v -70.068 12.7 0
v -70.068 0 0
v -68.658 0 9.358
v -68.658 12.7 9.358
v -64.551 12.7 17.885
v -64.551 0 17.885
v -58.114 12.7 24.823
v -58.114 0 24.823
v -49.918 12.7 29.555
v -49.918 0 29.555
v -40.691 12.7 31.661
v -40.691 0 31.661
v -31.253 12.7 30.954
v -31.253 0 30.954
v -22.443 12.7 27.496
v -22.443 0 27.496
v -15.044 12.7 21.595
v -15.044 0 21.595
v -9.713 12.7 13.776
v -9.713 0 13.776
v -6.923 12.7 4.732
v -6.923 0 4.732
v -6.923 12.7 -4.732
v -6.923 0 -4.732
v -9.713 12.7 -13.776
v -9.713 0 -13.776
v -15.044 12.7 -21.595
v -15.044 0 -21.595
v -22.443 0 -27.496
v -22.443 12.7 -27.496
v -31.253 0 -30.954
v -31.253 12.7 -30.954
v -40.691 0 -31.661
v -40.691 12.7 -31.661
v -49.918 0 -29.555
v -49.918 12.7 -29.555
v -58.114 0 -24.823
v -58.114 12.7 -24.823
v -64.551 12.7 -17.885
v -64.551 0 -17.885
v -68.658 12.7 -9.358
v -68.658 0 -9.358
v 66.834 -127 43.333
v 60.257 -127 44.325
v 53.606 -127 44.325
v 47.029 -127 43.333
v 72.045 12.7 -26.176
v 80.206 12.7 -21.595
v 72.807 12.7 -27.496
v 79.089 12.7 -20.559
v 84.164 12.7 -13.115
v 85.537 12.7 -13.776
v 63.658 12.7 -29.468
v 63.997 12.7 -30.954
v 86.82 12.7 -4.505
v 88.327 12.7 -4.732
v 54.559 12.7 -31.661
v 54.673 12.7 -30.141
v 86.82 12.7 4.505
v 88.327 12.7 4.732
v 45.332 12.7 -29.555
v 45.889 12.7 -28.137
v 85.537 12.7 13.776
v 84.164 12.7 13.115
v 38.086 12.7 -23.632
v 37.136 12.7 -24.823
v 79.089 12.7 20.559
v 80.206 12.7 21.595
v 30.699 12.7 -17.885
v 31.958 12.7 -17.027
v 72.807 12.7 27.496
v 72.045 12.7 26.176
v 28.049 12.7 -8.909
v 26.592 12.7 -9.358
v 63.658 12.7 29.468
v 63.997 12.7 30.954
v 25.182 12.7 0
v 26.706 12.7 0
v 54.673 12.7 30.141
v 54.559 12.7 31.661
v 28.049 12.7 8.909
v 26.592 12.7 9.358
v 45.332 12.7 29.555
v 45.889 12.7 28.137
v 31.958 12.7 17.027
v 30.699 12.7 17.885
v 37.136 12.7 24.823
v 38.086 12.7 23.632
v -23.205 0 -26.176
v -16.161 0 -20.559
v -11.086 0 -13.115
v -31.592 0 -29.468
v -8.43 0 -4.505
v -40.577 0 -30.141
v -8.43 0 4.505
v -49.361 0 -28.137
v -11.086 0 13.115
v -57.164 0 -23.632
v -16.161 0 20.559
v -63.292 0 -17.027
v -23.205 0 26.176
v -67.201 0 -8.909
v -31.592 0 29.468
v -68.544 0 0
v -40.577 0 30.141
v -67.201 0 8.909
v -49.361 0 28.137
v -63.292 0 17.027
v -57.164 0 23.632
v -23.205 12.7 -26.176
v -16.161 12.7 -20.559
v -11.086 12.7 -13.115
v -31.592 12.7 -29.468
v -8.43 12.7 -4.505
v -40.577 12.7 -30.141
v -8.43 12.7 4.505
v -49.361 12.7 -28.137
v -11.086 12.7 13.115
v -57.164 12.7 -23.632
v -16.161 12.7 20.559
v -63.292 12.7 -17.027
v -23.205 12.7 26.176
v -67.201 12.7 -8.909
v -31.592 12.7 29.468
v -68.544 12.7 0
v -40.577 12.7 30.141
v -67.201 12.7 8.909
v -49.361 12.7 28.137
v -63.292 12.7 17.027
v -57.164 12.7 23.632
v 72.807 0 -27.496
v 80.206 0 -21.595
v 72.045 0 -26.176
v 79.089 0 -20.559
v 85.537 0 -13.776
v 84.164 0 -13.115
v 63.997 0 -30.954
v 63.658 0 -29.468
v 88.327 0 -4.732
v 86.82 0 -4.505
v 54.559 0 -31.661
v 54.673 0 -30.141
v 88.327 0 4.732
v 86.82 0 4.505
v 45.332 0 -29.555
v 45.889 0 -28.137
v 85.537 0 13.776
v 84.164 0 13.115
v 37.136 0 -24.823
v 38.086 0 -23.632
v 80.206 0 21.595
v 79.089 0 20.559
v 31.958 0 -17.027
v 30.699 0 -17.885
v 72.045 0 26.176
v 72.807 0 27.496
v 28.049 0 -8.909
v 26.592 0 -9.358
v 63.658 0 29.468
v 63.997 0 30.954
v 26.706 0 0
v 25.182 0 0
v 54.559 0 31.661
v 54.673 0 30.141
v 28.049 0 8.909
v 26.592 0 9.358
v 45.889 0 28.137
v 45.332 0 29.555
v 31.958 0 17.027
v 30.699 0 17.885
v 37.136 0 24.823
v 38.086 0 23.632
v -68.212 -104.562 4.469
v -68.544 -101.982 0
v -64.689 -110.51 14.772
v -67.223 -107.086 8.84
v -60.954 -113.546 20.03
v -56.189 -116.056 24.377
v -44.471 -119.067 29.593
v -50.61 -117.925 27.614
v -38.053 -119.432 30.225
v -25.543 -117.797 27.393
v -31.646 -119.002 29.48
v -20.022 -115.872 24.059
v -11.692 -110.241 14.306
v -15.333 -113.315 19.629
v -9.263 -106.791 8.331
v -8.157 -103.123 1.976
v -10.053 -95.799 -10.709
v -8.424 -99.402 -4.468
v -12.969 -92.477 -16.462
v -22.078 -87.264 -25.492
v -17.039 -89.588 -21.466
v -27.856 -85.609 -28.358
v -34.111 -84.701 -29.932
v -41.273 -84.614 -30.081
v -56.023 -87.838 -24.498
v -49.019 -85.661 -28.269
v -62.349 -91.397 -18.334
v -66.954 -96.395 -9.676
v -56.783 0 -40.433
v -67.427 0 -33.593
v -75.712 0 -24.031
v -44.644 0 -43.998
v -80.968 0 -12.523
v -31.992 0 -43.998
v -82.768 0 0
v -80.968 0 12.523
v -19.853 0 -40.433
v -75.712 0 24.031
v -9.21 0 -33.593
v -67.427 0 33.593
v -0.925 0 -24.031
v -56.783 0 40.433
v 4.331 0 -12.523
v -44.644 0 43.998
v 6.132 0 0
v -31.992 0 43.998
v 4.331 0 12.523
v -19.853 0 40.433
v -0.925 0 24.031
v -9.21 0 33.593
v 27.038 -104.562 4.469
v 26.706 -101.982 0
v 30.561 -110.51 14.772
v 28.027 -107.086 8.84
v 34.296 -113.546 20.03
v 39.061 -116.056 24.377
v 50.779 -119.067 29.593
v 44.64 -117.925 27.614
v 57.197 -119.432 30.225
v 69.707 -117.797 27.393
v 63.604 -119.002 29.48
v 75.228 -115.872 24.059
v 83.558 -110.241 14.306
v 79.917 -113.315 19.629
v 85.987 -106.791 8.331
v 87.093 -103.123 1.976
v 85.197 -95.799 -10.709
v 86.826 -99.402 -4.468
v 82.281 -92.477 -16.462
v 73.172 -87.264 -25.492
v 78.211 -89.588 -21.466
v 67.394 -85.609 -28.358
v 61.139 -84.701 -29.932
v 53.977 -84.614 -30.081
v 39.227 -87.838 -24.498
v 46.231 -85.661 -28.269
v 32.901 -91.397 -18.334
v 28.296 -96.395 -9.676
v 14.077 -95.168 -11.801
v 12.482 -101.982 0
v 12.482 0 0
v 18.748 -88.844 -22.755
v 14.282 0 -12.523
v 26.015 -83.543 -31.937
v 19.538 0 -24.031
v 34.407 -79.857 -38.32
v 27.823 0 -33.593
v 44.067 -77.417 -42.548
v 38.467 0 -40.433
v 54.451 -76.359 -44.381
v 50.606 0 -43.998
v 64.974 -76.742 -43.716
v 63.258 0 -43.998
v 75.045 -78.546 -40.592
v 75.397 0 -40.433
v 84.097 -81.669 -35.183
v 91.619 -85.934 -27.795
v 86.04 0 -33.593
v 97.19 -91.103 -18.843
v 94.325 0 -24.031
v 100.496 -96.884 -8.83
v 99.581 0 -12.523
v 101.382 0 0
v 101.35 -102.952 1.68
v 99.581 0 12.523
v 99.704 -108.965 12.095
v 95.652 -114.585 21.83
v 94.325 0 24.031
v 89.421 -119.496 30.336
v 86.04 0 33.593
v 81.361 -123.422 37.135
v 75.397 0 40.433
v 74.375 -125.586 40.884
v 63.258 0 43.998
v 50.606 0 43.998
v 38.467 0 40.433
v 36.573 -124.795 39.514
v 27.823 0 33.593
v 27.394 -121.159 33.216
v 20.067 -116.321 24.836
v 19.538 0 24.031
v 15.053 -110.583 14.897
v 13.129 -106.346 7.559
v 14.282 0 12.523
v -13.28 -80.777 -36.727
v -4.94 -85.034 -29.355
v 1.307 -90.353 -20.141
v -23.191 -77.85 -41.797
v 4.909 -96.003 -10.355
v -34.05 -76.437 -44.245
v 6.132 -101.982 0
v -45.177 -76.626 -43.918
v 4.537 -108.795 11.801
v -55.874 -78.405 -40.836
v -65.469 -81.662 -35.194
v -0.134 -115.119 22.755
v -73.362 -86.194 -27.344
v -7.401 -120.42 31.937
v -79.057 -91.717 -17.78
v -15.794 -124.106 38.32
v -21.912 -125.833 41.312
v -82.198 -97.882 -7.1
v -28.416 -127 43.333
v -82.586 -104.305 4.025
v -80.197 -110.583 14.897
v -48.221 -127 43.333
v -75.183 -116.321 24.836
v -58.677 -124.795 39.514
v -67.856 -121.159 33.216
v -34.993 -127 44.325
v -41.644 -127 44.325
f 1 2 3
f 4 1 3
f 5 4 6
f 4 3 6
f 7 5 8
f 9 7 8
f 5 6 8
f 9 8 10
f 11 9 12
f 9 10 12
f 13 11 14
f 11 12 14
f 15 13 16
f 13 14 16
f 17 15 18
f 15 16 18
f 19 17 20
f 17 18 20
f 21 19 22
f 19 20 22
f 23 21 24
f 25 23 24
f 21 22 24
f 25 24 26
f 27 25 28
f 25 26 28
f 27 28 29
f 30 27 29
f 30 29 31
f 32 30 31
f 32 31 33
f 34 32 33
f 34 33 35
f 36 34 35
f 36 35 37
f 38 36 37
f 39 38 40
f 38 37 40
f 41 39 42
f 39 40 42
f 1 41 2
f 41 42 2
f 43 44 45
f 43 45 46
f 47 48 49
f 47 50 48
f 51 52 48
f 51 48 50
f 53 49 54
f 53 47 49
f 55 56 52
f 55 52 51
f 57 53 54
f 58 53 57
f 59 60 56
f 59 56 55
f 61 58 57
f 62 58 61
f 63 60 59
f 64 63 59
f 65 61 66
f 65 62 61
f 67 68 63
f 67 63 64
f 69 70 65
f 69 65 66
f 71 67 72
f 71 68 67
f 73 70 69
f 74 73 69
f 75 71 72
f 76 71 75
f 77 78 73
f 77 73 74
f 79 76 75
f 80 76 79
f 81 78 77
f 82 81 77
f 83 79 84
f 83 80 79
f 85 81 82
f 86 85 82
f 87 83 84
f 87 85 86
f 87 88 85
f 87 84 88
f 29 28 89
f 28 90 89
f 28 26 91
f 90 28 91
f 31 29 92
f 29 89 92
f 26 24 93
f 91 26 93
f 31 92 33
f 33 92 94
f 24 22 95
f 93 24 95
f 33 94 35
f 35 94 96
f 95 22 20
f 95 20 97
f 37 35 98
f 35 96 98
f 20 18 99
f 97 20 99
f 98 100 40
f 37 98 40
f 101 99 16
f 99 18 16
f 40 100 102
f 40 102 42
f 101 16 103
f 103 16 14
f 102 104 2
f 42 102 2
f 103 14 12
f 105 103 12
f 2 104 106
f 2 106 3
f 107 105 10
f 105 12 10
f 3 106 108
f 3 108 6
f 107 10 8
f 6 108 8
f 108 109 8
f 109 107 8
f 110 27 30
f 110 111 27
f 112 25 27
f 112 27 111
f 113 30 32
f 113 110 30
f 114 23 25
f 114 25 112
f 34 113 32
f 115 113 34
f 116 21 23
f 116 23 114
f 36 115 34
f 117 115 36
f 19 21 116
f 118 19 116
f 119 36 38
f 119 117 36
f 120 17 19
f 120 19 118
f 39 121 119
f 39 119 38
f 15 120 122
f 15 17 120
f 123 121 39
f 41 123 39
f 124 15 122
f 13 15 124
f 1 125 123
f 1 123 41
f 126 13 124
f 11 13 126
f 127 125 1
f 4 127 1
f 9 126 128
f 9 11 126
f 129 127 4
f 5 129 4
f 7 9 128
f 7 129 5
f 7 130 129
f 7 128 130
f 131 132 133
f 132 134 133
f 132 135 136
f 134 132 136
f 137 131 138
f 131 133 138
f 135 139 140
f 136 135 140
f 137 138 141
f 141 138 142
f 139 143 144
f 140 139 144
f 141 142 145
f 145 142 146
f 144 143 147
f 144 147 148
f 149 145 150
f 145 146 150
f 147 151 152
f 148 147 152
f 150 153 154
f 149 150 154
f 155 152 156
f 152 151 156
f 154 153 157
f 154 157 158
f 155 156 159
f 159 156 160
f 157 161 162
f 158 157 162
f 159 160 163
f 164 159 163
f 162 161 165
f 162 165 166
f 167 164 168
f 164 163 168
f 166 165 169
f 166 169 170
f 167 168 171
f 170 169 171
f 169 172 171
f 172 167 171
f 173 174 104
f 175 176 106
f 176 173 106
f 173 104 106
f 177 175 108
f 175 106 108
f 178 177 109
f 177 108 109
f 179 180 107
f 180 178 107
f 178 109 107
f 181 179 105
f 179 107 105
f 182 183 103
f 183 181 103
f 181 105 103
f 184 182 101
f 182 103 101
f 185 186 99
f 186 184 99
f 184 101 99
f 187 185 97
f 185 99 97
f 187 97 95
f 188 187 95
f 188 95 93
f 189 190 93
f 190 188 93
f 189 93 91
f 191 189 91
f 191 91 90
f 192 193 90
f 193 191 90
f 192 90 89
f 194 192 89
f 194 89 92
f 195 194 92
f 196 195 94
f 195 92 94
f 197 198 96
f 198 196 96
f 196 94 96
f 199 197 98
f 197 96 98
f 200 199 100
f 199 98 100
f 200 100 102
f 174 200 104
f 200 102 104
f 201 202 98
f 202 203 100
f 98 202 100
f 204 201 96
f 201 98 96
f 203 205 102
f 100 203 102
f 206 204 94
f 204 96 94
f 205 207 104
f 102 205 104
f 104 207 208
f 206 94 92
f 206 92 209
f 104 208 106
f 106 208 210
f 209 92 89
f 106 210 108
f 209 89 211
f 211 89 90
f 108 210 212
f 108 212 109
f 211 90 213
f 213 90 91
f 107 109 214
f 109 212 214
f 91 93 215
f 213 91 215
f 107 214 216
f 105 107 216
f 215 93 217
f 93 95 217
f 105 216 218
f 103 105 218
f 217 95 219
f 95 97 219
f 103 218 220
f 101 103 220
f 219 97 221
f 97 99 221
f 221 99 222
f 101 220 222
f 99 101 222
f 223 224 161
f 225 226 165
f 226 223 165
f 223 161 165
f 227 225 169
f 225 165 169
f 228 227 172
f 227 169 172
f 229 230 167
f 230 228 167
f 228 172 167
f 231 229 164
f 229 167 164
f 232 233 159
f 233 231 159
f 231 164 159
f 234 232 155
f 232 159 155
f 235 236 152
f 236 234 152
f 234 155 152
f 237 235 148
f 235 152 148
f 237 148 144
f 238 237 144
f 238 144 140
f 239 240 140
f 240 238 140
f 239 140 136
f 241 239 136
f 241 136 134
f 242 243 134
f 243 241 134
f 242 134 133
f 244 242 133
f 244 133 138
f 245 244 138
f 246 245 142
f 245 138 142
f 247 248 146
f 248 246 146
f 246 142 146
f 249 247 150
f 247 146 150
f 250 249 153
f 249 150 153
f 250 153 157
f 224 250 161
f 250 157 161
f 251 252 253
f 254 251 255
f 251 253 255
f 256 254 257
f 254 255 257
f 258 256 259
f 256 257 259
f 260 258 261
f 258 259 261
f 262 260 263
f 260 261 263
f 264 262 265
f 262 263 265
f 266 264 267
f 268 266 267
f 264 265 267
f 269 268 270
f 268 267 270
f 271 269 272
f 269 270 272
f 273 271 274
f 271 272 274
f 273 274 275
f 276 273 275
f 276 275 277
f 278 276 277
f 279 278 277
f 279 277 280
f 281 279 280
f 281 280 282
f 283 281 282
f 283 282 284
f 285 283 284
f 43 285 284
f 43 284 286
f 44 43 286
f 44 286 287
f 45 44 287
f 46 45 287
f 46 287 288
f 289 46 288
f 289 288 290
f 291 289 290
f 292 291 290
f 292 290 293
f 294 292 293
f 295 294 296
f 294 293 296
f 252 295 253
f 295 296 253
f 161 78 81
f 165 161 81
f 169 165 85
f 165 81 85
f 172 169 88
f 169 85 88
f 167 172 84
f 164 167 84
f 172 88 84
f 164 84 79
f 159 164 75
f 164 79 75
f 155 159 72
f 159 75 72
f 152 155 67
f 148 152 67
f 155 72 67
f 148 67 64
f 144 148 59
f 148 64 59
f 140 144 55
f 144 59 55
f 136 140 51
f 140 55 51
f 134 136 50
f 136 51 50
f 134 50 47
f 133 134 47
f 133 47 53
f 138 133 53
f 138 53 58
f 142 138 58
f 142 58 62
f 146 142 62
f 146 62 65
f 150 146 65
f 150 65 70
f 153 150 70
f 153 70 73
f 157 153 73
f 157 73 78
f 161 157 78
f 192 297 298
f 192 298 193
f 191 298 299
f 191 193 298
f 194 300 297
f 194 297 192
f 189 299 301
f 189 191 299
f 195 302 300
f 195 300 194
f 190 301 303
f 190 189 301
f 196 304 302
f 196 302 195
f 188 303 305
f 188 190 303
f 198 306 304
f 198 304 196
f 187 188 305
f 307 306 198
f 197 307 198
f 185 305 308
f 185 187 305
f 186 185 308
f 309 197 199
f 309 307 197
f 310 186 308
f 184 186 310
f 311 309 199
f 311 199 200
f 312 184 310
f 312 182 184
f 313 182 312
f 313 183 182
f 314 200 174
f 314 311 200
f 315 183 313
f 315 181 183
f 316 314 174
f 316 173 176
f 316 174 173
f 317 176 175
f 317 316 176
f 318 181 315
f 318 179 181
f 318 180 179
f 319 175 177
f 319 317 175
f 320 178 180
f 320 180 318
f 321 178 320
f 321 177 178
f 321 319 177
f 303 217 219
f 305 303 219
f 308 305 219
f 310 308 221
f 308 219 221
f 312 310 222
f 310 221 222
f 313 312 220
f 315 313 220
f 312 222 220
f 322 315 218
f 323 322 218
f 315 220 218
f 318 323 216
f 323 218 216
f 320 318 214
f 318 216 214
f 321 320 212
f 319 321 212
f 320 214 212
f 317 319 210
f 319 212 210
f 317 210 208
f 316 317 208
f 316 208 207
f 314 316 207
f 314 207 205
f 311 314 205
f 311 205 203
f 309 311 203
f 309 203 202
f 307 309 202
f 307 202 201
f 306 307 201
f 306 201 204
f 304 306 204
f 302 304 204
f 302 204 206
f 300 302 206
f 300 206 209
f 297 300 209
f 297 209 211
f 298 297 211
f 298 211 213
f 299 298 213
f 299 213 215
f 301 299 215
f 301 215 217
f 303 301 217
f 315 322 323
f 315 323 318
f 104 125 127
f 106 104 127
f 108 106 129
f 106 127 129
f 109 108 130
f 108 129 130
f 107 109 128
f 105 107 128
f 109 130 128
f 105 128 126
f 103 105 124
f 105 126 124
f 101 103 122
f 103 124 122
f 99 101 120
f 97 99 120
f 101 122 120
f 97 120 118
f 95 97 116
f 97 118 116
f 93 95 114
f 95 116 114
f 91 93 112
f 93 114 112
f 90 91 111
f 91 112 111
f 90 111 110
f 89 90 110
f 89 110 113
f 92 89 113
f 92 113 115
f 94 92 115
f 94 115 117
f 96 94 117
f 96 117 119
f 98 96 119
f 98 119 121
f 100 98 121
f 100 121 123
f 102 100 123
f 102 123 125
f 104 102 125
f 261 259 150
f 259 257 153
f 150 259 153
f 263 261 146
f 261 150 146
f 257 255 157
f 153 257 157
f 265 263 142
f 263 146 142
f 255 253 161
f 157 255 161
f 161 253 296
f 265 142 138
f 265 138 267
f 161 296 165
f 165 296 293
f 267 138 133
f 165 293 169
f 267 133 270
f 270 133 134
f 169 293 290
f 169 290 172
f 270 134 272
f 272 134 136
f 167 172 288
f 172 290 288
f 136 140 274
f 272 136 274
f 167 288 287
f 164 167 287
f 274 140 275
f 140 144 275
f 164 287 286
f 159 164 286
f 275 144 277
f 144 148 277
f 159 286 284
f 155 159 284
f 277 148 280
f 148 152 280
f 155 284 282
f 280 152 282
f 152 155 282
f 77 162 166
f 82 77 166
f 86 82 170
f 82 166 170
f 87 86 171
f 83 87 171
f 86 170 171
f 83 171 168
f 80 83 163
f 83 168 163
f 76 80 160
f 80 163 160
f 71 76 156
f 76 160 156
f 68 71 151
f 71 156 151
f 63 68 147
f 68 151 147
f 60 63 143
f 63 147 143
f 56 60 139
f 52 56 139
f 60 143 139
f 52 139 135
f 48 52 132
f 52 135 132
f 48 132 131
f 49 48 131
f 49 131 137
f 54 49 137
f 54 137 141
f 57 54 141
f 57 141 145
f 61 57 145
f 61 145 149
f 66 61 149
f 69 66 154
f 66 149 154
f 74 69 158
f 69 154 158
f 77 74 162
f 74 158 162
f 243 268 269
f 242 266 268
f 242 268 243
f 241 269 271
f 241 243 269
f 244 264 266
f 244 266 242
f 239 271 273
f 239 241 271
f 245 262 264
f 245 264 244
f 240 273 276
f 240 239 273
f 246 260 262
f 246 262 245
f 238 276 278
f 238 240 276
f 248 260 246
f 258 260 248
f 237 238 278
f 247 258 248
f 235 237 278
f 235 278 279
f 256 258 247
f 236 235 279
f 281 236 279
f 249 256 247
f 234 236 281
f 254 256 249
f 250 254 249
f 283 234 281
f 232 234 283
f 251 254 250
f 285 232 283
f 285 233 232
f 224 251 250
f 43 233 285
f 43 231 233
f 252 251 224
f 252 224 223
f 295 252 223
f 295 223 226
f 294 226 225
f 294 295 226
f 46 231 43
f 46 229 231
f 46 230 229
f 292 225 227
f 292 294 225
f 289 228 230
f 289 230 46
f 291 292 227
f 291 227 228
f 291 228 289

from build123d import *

# Parameters (mm, degrees)
F0_R          = 44.45
F1_DEPTH      = 127
F2_R          = 31.75
F3_DEPTH      = 12.7
F4_R          = 30.226
F5_DEPTH      = 139.701
F7_DEPTH      = 82.76927268
F7_DEPTH_BACK = 101.38272732


with BuildPart() as f1:
    # F0 (on Front) → F1 (new body)
    with BuildSketch(Plane.XZ):
        with Locations((-38.31827268, 0)):
            Circle(F0_R)
    extrude(amount=F1_DEPTH)


with BuildPart() as f1b:
    # F0 (on Front) → F1, piece 2 (new body)
    with BuildSketch(Plane.XZ):
        with BuildLine():
            ThreePointArc((101.38172732, 0), (56.93172732, 44.45), (12.48172732, 0))
            ThreePointArc((12.48172732, 0), (56.93172732, -44.45), (101.38172732, 0))
        make_face()
    extrude(amount=F1_DEPTH)


with BuildPart() as f3:
    # F2 (on face) → F3 (new body)
    with BuildSketch(Plane(origin=(0, 0, 0), x_dir=(-1, 0, 0), z_dir=(0, 1, 0))):
        with Locations((38.31827268, 0)):
            Circle(F2_R)
    extrude(amount=F3_DEPTH)


with BuildPart() as f3b:
    # F2 (on face) → F3, piece 2 (new body)
    with BuildSketch(Plane(origin=(0, 0, 0), x_dir=(-1, 0, 0), z_dir=(0, 1, 0))):
        with Locations((-56.93172732, 0)):
            Circle(F2_R)
    extrude(amount=F3_DEPTH)


with BuildPart() as f5_tool:
    # F4 (on face) → F5 (new body, through all)
    with BuildSketch(Plane(origin=(0, 12.7, 0), x_dir=(-1, 0, 0), z_dir=(0, 1, 0))):
        with Locations((-56.93172732, 0)):
            Circle(F4_R)
        with Locations((38.31827268, 0)):
            Circle(F4_R)
    extrude(amount=-F5_DEPTH)


with BuildPart() as f1_1:
    add(f1.part)

    # F5: cut by f5_tool
    add(f5_tool.part, mode=Mode.SUBTRACT)


with BuildPart() as f1b_1:
    add(f1b.part)

    # F5: cut by f5_tool
    add(f5_tool.part, mode=Mode.SUBTRACT)


with BuildPart() as f3_1:
    add(f3.part)

    # F5: cut by f5_tool
    add(f5_tool.part, mode=Mode.SUBTRACT)


with BuildPart() as f3b_1:
    add(f3b.part)

    # F5: cut by f5_tool
    add(f5_tool.part, mode=Mode.SUBTRACT)


with BuildPart() as f7_tool:
    # F6 (on Right) → F7 (new body, two sides)
    with BuildSketch(Plane.YZ) as f7_sk:
        Polygon((-59.1113475329, -74.2536739212), (-133.0174654722, 53.7554773399), (-133.0174654722, -74.2536739212), align=None)
    extrude(amount=-F7_DEPTH)
    extrude(f7_sk.sketch, amount=F7_DEPTH_BACK)


with BuildPart() as f1_2:
    add(f1_1.part)

    # F7: cut by f7_tool
    add(f7_tool.part, mode=Mode.SUBTRACT)


with BuildPart() as f1b_2:
    add(f1b_1.part)

    # F7: cut by f7_tool
    add(f7_tool.part, mode=Mode.SUBTRACT)


solid = Compound([f3_1.part, f3b_1.part, f1_2.part, f1b_2.part])
